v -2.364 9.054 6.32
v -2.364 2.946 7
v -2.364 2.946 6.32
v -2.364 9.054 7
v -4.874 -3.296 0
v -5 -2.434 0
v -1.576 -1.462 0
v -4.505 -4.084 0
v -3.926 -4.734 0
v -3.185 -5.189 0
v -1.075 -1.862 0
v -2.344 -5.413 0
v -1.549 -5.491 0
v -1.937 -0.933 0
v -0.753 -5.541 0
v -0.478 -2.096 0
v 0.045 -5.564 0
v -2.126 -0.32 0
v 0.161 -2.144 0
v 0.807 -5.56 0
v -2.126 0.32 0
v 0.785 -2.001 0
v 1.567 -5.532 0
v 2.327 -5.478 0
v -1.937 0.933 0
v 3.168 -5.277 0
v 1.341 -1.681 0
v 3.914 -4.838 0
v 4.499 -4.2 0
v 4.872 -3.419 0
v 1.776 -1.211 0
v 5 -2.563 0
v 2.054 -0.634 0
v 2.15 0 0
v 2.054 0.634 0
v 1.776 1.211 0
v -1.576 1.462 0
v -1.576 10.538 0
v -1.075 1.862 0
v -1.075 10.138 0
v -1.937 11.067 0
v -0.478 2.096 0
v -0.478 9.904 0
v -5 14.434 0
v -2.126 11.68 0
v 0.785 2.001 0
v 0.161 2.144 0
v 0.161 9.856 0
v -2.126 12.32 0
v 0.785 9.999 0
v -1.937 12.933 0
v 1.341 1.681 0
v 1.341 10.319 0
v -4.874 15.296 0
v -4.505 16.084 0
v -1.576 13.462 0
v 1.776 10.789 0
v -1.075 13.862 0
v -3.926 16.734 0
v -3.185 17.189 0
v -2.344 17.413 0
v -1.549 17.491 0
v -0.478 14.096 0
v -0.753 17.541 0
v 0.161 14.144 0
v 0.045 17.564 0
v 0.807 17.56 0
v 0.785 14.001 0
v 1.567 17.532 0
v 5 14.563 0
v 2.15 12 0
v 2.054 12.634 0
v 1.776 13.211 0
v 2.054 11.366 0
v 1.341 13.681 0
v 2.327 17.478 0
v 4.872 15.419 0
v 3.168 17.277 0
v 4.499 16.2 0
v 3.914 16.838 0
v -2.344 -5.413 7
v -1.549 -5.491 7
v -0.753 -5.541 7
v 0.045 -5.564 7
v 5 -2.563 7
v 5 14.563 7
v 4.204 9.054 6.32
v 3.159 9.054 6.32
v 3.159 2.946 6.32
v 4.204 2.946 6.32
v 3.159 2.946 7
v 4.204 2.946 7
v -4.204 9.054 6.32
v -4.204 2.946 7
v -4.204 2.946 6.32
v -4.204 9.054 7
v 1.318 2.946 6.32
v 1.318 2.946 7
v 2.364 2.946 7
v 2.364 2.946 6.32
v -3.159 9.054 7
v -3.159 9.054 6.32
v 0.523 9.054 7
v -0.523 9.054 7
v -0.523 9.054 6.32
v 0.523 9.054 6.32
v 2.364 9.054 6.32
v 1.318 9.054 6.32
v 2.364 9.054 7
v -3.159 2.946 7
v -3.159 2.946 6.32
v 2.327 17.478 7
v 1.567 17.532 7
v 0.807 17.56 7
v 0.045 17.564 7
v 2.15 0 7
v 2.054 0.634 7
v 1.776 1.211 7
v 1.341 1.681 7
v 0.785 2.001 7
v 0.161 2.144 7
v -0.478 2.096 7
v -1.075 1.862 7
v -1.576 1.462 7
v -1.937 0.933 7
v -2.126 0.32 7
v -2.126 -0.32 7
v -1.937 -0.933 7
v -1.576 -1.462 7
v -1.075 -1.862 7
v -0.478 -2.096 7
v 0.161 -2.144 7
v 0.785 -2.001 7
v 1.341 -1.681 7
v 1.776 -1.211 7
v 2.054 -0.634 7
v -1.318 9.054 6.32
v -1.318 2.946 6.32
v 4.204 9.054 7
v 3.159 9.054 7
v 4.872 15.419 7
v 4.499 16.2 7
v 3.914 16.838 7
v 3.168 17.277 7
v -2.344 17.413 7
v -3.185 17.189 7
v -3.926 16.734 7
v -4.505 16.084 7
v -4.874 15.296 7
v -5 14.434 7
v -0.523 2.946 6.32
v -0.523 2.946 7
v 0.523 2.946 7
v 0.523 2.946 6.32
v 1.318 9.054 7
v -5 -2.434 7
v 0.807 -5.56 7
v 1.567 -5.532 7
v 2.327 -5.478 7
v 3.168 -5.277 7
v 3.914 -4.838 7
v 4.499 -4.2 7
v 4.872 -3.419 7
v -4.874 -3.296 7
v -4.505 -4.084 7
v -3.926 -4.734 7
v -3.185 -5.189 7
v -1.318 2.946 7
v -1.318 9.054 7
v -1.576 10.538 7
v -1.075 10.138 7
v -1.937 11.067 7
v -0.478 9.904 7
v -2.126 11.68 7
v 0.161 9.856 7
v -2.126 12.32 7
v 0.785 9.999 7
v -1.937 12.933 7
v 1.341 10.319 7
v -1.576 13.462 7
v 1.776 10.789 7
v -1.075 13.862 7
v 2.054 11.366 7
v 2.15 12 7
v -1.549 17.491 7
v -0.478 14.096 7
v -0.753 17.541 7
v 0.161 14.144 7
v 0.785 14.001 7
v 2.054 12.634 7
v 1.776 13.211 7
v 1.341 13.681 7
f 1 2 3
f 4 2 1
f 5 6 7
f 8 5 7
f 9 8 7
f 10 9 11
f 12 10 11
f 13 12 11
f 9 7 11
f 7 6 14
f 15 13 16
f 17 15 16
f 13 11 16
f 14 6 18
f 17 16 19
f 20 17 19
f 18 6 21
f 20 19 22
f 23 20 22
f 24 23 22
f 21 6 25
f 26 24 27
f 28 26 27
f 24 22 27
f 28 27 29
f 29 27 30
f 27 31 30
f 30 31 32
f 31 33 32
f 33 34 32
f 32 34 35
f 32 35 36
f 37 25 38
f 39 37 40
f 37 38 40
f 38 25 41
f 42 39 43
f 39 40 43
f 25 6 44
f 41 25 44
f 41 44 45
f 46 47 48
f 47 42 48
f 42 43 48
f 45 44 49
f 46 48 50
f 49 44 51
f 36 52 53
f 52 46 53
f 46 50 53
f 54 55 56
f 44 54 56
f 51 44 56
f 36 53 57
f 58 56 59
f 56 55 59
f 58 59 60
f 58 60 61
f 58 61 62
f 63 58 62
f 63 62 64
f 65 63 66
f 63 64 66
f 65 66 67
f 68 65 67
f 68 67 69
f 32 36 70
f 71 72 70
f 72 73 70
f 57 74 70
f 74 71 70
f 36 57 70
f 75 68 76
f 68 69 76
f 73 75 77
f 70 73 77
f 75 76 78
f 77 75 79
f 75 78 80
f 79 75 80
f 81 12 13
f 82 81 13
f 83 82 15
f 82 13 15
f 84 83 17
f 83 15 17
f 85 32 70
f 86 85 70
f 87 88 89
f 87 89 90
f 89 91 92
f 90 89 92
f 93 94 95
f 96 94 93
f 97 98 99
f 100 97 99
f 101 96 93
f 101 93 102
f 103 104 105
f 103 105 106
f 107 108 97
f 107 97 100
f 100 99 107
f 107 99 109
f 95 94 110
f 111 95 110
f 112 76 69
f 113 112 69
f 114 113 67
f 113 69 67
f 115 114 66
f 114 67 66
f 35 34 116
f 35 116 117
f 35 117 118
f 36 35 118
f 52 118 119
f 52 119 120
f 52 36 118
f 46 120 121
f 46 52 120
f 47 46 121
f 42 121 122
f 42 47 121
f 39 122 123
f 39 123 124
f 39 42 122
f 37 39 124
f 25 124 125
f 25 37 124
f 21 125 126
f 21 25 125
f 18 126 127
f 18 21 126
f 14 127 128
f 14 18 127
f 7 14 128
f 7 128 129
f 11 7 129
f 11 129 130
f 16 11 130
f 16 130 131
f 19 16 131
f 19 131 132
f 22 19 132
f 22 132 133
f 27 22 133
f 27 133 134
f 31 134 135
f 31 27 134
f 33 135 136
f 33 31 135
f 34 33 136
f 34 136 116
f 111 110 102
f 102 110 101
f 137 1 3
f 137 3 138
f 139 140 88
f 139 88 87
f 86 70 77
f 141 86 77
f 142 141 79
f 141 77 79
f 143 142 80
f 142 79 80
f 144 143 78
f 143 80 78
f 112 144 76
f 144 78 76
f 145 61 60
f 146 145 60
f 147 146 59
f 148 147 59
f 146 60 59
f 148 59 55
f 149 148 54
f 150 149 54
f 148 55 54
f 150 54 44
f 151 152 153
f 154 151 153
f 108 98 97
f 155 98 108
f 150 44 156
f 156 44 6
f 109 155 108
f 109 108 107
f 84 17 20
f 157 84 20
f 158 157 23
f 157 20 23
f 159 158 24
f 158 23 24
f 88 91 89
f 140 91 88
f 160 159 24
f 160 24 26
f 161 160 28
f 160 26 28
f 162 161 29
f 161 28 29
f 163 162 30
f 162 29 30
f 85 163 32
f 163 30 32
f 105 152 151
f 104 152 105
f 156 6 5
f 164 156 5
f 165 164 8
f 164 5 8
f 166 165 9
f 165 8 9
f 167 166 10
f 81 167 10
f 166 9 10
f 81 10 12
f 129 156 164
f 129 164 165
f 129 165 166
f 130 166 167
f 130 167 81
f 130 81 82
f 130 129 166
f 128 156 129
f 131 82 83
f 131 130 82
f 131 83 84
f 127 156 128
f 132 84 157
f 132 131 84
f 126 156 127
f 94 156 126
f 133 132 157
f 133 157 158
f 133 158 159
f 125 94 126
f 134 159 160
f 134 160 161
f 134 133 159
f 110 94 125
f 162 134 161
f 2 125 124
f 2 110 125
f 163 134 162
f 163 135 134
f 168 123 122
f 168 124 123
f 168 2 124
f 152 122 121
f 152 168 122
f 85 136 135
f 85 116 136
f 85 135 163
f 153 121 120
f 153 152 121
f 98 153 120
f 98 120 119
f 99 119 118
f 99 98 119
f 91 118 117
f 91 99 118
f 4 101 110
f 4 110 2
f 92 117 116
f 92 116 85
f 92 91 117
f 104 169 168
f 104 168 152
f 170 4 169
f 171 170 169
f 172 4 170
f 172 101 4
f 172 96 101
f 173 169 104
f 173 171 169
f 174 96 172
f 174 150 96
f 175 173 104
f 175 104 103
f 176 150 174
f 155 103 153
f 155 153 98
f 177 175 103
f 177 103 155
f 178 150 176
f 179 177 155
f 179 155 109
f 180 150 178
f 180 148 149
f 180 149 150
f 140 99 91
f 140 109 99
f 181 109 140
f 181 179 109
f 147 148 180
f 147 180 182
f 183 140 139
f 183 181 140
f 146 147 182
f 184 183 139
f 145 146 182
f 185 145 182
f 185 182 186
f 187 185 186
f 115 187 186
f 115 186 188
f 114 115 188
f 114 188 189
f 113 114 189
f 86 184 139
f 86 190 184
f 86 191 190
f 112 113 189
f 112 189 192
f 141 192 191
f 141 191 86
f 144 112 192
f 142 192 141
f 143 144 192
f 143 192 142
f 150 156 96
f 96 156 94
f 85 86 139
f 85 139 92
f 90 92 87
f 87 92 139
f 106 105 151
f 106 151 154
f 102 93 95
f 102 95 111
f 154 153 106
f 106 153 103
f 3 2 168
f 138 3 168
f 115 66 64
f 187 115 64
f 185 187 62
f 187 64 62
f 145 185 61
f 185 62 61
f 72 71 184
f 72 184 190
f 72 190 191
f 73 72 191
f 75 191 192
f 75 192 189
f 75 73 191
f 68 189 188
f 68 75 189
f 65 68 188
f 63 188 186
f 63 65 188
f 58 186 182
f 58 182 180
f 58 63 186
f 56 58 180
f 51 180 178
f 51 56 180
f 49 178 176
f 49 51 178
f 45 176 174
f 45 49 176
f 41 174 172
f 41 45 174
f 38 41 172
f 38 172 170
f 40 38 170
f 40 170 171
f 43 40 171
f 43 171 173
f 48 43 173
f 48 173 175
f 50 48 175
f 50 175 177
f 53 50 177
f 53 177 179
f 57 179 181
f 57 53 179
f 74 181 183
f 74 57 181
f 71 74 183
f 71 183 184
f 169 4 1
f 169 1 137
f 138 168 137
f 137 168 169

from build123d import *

# Parameters (mm, degrees)
SKETCH1_R           = 2.15
BOSS_EXTRUDE1_DEPTH = 7
SKETCH4_W           = 1.04528
SKETCH4_H           = 6.1088
CUT_EXTRUDE2_DEPTH  = 0.68


with BuildPart() as part:
    # Sketch1 → Boss-Extrude1 (new body)
    with BuildSketch(Plane.XY):
        with BuildLine():
            Line((-5, 14.434422223), (-5, -2.434422223))
            ThreePointArc((-5, -2.434422223), (-4.239496508, -4.429977284), (-2.343767283, -5.413245441))
            ThreePointArc((-2.343767283, -5.413245441), (-1.151217334, -5.519255542), (0.045204926, -5.563834645))
            ThreePointArc((0.045204926, -5.563834645), (1.187062084, -5.549004877), (2.326819369, -5.478216303))
            ThreePointArc((2.326819369, -5.478216303), (4.230533554, -4.540680035), (5, -2.563049296))
            Line((5, -2.563049296), (5, 14.563049296))
            ThreePointArc((5, 14.563049296), (4.230533554, 16.540680035), (2.326819369, 17.478216303))
            ThreePointArc((2.326819369, 17.478216303), (1.187062084, 17.549004877), (0.045204926, 17.563834645))
            ThreePointArc((0.045204926, 17.563834645), (-1.151217334, 17.519255542), (-2.343767283, 17.413245441))
            ThreePointArc((-2.343767283, 17.413245441), (-4.239496508, 16.429977284), (-5, 14.434422223))
        make_face()
        Circle(SKETCH1_R, mode=Mode.SUBTRACT)
        with Locations((0, 12)):
            Circle(SKETCH1_R, mode=Mode.SUBTRACT)
    extrude(amount=BOSS_EXTRUDE1_DEPTH)

    # Sketch4 → Cut-Extrude2 (cut)
    with BuildSketch(Plane.XY.offset(7)):
        with Locations((-3.68176, 6)):
            Rectangle(SKETCH4_W, SKETCH4_H)
        with Locations((-1.84088, 6)):
            Rectangle(SKETCH4_W, SKETCH4_H)
        with Locations((0, 6)):
            Rectangle(SKETCH4_W, SKETCH4_H)
        with Locations((1.84088, 6)):
            Rectangle(SKETCH4_W, SKETCH4_H)
        with Locations((3.68176, 6)):
            Rectangle(SKETCH4_W, SKETCH4_H)
    extrude(amount=-CUT_EXTRUDE2_DEPTH, mode=Mode.SUBTRACT)


solid = part.part
